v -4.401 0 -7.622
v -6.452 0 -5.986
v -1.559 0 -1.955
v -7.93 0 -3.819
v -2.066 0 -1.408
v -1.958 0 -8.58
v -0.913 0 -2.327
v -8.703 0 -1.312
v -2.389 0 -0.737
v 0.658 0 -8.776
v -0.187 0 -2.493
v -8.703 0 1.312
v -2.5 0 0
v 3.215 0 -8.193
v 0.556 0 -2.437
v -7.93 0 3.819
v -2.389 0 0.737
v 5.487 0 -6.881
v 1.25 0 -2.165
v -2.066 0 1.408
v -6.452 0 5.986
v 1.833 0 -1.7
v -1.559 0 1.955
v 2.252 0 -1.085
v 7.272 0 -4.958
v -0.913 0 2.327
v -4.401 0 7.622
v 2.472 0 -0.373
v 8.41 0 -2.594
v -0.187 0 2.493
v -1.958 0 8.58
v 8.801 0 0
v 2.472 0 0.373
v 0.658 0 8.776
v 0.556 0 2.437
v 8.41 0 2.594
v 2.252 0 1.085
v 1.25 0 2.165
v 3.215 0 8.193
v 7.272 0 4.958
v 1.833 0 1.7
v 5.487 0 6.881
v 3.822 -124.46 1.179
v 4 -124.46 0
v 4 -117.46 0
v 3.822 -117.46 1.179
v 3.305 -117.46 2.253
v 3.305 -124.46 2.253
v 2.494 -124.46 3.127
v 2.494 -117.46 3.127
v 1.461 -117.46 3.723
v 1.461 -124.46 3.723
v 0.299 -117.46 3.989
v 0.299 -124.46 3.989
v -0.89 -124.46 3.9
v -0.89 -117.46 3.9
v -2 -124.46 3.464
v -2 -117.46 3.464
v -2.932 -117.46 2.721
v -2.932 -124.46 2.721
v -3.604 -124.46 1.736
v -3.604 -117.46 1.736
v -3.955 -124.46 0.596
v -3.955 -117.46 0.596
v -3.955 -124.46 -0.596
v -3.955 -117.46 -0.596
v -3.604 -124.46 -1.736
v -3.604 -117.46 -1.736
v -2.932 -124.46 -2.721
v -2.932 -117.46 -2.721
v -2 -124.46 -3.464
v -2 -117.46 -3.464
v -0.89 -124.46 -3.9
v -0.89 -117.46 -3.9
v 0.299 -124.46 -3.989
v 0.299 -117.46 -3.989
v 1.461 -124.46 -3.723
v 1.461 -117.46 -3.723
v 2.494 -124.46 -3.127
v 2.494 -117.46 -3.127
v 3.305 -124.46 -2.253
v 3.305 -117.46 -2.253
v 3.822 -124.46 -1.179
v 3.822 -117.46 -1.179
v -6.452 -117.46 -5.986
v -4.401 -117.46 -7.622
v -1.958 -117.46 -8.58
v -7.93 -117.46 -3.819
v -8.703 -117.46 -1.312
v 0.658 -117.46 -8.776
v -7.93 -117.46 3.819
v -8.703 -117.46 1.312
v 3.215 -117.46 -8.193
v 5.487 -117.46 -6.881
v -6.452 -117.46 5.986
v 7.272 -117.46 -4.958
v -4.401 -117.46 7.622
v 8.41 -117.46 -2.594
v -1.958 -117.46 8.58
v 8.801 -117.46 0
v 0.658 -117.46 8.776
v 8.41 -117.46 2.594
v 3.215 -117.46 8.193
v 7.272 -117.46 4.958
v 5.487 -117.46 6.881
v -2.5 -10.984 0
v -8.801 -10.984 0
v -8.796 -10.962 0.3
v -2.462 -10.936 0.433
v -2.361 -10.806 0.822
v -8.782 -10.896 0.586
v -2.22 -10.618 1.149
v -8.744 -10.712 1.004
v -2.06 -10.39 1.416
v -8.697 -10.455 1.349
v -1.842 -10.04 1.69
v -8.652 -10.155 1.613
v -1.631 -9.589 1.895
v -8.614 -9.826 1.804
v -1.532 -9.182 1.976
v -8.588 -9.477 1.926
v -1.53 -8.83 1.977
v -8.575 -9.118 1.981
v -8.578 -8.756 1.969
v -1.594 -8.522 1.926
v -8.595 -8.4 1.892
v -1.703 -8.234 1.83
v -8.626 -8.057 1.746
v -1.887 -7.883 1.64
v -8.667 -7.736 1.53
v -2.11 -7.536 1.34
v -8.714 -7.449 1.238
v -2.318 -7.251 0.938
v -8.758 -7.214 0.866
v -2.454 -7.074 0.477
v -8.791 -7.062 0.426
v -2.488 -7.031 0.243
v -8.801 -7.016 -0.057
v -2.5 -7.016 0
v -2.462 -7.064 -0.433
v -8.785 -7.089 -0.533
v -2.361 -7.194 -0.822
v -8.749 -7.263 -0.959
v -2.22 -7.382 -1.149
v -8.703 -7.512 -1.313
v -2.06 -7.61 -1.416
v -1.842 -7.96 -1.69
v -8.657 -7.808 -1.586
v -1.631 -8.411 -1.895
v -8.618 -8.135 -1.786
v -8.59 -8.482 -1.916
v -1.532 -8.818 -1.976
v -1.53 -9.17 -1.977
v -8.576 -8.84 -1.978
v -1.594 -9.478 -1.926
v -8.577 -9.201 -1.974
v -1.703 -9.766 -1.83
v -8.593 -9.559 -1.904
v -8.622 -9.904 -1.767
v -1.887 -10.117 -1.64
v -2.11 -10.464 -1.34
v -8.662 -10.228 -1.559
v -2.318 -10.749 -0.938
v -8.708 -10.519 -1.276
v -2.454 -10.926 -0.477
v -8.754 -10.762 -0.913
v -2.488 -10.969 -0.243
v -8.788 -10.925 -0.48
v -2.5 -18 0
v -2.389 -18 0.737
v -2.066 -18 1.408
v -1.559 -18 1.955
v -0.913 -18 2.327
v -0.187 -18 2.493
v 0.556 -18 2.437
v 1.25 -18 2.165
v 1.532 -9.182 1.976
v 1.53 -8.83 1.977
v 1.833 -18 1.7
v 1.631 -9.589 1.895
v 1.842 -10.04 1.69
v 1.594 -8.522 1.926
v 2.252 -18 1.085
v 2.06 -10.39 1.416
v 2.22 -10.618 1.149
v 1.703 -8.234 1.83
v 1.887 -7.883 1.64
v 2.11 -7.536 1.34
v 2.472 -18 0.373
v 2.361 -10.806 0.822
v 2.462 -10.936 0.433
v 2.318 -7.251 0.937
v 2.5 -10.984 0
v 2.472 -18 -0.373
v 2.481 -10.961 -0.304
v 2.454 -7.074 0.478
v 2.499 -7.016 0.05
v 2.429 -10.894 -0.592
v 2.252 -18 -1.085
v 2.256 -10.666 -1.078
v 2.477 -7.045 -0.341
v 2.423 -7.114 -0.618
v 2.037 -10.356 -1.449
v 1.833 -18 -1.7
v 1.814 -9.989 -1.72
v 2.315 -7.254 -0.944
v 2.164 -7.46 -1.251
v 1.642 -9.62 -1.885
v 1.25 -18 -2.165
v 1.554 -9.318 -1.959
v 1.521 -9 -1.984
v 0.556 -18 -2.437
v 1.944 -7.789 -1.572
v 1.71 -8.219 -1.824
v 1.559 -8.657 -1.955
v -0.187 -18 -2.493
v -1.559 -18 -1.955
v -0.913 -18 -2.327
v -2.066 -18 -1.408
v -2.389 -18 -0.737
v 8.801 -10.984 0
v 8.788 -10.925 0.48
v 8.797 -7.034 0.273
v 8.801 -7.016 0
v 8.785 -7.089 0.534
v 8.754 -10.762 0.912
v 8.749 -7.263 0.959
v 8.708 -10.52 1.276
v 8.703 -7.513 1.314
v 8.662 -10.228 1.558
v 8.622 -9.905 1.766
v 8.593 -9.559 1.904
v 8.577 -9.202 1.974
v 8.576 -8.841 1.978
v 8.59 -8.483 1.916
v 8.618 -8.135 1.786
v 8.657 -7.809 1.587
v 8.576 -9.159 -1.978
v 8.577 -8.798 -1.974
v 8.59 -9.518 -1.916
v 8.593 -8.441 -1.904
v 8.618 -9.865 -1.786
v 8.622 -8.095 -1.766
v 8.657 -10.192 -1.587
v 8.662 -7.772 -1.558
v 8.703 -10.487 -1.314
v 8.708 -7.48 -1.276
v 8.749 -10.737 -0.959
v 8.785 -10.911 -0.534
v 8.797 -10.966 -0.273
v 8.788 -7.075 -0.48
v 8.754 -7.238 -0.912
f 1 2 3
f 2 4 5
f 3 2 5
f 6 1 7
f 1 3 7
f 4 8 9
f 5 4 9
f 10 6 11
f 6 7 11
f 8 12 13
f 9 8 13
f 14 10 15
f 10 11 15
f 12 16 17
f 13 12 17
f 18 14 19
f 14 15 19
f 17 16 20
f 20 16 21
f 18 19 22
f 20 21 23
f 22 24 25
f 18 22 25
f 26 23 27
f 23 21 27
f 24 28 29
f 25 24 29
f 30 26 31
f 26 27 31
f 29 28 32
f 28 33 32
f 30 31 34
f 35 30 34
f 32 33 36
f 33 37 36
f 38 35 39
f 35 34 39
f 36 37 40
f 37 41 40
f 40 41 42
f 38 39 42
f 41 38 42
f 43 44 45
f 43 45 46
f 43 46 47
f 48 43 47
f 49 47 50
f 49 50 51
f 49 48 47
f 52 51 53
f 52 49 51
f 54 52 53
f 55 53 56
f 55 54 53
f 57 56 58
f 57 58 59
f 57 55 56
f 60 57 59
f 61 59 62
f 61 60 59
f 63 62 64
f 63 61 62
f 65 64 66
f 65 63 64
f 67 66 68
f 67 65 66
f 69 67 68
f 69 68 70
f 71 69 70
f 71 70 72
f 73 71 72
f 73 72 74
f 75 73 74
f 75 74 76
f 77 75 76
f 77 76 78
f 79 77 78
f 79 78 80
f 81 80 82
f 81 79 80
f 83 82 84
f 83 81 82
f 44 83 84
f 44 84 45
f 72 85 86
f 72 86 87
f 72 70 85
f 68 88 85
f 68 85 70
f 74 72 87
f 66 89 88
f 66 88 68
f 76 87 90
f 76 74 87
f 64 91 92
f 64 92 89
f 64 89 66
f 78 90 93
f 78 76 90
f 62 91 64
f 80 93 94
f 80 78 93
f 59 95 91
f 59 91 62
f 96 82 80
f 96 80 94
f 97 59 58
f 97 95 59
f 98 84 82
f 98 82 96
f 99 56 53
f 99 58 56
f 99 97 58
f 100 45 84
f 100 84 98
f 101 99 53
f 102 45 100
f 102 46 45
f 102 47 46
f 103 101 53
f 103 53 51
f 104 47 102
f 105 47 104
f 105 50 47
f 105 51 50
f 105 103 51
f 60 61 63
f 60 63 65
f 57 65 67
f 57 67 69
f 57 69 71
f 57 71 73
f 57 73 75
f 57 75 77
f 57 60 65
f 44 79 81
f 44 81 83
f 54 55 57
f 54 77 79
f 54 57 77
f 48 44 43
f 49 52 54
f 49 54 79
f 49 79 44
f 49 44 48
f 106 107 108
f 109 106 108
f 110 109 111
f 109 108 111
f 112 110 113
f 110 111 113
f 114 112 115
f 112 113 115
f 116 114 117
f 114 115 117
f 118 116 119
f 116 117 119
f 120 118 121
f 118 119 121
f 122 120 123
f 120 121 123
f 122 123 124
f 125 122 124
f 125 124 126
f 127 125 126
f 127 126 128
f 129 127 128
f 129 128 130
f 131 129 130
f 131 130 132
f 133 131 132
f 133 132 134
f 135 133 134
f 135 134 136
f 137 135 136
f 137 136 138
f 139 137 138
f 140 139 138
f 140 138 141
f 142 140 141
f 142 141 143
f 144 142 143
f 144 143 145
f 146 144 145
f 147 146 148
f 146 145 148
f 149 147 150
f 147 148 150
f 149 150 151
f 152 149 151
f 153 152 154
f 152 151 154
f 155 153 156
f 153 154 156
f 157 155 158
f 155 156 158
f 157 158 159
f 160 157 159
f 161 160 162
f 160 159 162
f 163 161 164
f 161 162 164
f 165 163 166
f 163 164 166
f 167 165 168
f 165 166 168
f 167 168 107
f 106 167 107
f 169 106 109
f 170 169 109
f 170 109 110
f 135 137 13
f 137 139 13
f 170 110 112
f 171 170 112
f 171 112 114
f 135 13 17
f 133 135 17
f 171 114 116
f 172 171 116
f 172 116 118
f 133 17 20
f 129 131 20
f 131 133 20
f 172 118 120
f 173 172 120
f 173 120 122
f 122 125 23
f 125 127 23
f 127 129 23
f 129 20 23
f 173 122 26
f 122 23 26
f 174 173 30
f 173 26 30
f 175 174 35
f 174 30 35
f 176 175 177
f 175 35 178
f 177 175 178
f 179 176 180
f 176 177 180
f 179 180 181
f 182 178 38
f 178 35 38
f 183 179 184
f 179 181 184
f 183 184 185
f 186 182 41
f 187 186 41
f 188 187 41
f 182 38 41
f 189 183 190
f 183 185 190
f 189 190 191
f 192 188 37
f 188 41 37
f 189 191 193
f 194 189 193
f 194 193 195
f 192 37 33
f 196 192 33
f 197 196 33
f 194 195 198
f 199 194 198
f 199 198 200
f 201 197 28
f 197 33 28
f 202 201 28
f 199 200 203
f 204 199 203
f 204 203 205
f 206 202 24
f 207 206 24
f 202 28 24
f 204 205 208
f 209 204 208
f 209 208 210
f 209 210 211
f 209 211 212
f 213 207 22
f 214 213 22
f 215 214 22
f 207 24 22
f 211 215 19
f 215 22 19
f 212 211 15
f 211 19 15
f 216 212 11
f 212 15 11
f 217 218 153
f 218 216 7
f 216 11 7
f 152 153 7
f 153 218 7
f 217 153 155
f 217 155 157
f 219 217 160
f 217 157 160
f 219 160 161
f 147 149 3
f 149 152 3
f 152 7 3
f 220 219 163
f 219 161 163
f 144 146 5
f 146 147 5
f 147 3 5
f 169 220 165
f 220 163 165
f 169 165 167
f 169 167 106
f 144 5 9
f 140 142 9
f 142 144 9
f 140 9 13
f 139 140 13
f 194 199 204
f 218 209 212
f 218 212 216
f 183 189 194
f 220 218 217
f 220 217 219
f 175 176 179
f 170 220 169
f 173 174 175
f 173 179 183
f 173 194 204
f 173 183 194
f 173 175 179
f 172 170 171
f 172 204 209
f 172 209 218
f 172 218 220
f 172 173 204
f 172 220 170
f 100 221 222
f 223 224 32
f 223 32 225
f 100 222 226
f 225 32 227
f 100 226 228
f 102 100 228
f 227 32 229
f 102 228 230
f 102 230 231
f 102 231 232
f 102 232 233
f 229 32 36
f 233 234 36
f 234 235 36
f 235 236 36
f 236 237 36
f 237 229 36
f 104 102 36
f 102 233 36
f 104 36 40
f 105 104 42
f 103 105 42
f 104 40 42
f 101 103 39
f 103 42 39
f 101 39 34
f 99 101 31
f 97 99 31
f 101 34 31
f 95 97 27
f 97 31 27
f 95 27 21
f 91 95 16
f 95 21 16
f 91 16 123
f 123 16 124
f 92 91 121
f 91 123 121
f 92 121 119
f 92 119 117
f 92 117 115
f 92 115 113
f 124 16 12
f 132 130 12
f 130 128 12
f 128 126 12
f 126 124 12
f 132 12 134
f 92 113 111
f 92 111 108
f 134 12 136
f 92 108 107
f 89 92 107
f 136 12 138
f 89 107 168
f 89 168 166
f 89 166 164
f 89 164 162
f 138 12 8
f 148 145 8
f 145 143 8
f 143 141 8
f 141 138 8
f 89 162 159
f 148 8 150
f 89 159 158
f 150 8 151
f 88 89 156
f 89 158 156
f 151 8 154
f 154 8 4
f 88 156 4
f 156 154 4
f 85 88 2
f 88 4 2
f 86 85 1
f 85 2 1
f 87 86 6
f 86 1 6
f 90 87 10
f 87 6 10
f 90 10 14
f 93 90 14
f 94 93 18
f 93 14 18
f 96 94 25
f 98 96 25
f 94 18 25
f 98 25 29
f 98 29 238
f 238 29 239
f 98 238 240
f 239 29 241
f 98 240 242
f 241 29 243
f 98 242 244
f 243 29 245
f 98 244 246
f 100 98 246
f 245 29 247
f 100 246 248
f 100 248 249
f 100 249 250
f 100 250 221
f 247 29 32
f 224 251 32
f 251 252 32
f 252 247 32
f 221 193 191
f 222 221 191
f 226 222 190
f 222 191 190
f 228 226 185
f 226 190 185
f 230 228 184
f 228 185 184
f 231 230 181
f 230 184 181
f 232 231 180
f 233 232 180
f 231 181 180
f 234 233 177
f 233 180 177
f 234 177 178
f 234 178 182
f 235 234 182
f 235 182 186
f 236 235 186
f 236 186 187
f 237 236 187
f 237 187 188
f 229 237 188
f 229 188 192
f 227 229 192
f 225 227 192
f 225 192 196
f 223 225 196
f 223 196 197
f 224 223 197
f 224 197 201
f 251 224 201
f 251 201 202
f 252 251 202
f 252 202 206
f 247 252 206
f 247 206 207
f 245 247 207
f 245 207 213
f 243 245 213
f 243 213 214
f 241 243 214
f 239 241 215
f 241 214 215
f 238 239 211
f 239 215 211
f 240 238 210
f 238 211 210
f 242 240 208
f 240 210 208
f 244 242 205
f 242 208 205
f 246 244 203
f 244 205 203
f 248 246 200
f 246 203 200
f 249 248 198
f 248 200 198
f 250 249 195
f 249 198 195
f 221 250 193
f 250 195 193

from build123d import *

# Parameters (mm, degrees)
F0_R     = 8.8011
F1_DEPTH = 124.46
F2_R     = 8.8011
F2_R_2   = 4
F3_DEPTH = 7
F4_R     = 2.5
F5_DEPTH = 18
F8_R     = 1.984375
F9_DEPTH = 17.6032


with BuildPart() as f1:
    # F0 (on Front) → F1 (new body)
    with BuildSketch(Plane.XZ):
        Circle(F0_R)
    extrude(amount=F1_DEPTH)

    # F2 (on face) → F3 (cut)
    with BuildSketch(Plane.XZ.offset(124.46)):
        Circle(F2_R)
        Circle(F2_R_2, mode=Mode.SUBTRACT)
    extrude(amount=-F3_DEPTH, mode=Mode.SUBTRACT)

    # F4 (on face) → F5 (cut)
    with BuildSketch(Plane(origin=(0, 0, 0), x_dir=(-1, 0, 0), z_dir=(0, 1, 0))):
        Circle(F4_R)
    extrude(amount=-F5_DEPTH, mode=Mode.SUBTRACT)

    # F8 (on face) → F9 (cut, through all)
    with BuildSketch(Plane(origin=(-8.8011, 0, 0), x_dir=(0, -1, 0), z_dir=(-1, 0, 0))):
        with Locations((9, 0)):
            Circle(F8_R)
    extrude(amount=-F9_DEPTH, mode=Mode.SUBTRACT)


solid = f1.part
